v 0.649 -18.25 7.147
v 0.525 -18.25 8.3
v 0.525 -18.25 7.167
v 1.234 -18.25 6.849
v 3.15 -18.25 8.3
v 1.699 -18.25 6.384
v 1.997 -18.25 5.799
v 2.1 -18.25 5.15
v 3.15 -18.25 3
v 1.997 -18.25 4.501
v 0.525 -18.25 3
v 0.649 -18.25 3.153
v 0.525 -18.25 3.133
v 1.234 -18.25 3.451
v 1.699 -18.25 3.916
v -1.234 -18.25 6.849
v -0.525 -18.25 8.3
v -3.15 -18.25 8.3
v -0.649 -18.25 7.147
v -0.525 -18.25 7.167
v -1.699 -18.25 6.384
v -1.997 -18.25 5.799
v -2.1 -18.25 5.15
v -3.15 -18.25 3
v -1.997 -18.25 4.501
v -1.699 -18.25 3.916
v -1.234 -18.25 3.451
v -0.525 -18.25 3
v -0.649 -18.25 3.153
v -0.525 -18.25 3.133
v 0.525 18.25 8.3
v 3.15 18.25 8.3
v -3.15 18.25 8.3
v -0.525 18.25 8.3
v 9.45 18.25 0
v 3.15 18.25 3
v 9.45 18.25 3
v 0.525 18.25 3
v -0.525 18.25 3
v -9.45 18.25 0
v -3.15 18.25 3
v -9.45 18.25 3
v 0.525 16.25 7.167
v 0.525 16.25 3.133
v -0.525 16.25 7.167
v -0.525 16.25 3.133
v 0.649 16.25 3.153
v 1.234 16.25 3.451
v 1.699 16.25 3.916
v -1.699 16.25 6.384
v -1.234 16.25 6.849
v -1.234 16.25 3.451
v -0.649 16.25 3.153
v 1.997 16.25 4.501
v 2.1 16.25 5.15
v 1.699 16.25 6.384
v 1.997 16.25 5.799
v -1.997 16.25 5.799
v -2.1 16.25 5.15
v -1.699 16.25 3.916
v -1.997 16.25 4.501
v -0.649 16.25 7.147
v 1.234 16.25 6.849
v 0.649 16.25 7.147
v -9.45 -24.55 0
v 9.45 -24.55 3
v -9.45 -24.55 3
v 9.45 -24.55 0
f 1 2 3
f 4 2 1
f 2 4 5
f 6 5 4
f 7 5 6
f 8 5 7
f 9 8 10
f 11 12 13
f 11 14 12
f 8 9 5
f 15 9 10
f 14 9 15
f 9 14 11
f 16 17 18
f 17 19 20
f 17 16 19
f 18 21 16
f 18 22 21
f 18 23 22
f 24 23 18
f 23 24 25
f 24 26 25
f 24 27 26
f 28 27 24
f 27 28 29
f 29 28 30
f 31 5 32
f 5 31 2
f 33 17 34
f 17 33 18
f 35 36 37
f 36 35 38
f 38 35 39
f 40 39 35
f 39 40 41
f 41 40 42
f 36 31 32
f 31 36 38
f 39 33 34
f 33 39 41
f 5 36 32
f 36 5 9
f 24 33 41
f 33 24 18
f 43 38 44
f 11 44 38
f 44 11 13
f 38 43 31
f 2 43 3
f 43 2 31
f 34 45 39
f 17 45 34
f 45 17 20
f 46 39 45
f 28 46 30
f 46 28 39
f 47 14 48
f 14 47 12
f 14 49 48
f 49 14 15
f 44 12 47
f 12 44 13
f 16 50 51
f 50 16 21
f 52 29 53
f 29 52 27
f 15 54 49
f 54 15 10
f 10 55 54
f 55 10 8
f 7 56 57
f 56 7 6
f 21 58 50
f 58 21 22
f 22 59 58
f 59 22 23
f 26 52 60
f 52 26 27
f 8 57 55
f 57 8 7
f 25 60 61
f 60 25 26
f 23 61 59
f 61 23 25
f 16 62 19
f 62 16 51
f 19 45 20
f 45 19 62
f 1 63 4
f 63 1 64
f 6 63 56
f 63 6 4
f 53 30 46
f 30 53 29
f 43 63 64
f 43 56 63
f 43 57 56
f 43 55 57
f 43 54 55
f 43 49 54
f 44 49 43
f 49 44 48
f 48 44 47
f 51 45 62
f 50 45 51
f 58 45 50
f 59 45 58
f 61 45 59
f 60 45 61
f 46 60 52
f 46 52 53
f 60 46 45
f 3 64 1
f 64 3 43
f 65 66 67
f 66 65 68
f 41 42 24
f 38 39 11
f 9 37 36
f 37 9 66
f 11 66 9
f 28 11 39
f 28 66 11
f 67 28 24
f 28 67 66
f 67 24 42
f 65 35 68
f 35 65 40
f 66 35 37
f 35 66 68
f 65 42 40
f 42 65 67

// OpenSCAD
// PTFE tube length
tube_length = 34.5;

// PTFE tube outside diameter 
tube_od = 4.2;

module jig(){
    buf = 1;
    jig_size = tube_od * 1.5;
    base_ht = 3;
    body_length = tube_length+(buf*2);
    base_off = 0.5;
    rotate([0,0,270])
    // put it on the platform
    translate([0,0,(jig_size/2 + base_ht/2)+base_off])
    {
    difference(){
        cube([body_length,jig_size,jig_size],center=true); // jig body
        cube([body_length,(tube_od/4),jig_size],center=true); // push slot
        translate([buf,0,0]) rotate(90,[0,1,0])
            cylinder(d=tube_od,h=tube_length, center=true); // tube hole
    }
    // base plate (offest to make a cutting base)
    cut_brd = jig_size;
    translate([cut_brd/2,0,(jig_size/2*-1)-base_off])
        cube([body_length+cut_brd,jig_size*3,base_ht],center=true);
    }
}

$fn=20;
jig();
